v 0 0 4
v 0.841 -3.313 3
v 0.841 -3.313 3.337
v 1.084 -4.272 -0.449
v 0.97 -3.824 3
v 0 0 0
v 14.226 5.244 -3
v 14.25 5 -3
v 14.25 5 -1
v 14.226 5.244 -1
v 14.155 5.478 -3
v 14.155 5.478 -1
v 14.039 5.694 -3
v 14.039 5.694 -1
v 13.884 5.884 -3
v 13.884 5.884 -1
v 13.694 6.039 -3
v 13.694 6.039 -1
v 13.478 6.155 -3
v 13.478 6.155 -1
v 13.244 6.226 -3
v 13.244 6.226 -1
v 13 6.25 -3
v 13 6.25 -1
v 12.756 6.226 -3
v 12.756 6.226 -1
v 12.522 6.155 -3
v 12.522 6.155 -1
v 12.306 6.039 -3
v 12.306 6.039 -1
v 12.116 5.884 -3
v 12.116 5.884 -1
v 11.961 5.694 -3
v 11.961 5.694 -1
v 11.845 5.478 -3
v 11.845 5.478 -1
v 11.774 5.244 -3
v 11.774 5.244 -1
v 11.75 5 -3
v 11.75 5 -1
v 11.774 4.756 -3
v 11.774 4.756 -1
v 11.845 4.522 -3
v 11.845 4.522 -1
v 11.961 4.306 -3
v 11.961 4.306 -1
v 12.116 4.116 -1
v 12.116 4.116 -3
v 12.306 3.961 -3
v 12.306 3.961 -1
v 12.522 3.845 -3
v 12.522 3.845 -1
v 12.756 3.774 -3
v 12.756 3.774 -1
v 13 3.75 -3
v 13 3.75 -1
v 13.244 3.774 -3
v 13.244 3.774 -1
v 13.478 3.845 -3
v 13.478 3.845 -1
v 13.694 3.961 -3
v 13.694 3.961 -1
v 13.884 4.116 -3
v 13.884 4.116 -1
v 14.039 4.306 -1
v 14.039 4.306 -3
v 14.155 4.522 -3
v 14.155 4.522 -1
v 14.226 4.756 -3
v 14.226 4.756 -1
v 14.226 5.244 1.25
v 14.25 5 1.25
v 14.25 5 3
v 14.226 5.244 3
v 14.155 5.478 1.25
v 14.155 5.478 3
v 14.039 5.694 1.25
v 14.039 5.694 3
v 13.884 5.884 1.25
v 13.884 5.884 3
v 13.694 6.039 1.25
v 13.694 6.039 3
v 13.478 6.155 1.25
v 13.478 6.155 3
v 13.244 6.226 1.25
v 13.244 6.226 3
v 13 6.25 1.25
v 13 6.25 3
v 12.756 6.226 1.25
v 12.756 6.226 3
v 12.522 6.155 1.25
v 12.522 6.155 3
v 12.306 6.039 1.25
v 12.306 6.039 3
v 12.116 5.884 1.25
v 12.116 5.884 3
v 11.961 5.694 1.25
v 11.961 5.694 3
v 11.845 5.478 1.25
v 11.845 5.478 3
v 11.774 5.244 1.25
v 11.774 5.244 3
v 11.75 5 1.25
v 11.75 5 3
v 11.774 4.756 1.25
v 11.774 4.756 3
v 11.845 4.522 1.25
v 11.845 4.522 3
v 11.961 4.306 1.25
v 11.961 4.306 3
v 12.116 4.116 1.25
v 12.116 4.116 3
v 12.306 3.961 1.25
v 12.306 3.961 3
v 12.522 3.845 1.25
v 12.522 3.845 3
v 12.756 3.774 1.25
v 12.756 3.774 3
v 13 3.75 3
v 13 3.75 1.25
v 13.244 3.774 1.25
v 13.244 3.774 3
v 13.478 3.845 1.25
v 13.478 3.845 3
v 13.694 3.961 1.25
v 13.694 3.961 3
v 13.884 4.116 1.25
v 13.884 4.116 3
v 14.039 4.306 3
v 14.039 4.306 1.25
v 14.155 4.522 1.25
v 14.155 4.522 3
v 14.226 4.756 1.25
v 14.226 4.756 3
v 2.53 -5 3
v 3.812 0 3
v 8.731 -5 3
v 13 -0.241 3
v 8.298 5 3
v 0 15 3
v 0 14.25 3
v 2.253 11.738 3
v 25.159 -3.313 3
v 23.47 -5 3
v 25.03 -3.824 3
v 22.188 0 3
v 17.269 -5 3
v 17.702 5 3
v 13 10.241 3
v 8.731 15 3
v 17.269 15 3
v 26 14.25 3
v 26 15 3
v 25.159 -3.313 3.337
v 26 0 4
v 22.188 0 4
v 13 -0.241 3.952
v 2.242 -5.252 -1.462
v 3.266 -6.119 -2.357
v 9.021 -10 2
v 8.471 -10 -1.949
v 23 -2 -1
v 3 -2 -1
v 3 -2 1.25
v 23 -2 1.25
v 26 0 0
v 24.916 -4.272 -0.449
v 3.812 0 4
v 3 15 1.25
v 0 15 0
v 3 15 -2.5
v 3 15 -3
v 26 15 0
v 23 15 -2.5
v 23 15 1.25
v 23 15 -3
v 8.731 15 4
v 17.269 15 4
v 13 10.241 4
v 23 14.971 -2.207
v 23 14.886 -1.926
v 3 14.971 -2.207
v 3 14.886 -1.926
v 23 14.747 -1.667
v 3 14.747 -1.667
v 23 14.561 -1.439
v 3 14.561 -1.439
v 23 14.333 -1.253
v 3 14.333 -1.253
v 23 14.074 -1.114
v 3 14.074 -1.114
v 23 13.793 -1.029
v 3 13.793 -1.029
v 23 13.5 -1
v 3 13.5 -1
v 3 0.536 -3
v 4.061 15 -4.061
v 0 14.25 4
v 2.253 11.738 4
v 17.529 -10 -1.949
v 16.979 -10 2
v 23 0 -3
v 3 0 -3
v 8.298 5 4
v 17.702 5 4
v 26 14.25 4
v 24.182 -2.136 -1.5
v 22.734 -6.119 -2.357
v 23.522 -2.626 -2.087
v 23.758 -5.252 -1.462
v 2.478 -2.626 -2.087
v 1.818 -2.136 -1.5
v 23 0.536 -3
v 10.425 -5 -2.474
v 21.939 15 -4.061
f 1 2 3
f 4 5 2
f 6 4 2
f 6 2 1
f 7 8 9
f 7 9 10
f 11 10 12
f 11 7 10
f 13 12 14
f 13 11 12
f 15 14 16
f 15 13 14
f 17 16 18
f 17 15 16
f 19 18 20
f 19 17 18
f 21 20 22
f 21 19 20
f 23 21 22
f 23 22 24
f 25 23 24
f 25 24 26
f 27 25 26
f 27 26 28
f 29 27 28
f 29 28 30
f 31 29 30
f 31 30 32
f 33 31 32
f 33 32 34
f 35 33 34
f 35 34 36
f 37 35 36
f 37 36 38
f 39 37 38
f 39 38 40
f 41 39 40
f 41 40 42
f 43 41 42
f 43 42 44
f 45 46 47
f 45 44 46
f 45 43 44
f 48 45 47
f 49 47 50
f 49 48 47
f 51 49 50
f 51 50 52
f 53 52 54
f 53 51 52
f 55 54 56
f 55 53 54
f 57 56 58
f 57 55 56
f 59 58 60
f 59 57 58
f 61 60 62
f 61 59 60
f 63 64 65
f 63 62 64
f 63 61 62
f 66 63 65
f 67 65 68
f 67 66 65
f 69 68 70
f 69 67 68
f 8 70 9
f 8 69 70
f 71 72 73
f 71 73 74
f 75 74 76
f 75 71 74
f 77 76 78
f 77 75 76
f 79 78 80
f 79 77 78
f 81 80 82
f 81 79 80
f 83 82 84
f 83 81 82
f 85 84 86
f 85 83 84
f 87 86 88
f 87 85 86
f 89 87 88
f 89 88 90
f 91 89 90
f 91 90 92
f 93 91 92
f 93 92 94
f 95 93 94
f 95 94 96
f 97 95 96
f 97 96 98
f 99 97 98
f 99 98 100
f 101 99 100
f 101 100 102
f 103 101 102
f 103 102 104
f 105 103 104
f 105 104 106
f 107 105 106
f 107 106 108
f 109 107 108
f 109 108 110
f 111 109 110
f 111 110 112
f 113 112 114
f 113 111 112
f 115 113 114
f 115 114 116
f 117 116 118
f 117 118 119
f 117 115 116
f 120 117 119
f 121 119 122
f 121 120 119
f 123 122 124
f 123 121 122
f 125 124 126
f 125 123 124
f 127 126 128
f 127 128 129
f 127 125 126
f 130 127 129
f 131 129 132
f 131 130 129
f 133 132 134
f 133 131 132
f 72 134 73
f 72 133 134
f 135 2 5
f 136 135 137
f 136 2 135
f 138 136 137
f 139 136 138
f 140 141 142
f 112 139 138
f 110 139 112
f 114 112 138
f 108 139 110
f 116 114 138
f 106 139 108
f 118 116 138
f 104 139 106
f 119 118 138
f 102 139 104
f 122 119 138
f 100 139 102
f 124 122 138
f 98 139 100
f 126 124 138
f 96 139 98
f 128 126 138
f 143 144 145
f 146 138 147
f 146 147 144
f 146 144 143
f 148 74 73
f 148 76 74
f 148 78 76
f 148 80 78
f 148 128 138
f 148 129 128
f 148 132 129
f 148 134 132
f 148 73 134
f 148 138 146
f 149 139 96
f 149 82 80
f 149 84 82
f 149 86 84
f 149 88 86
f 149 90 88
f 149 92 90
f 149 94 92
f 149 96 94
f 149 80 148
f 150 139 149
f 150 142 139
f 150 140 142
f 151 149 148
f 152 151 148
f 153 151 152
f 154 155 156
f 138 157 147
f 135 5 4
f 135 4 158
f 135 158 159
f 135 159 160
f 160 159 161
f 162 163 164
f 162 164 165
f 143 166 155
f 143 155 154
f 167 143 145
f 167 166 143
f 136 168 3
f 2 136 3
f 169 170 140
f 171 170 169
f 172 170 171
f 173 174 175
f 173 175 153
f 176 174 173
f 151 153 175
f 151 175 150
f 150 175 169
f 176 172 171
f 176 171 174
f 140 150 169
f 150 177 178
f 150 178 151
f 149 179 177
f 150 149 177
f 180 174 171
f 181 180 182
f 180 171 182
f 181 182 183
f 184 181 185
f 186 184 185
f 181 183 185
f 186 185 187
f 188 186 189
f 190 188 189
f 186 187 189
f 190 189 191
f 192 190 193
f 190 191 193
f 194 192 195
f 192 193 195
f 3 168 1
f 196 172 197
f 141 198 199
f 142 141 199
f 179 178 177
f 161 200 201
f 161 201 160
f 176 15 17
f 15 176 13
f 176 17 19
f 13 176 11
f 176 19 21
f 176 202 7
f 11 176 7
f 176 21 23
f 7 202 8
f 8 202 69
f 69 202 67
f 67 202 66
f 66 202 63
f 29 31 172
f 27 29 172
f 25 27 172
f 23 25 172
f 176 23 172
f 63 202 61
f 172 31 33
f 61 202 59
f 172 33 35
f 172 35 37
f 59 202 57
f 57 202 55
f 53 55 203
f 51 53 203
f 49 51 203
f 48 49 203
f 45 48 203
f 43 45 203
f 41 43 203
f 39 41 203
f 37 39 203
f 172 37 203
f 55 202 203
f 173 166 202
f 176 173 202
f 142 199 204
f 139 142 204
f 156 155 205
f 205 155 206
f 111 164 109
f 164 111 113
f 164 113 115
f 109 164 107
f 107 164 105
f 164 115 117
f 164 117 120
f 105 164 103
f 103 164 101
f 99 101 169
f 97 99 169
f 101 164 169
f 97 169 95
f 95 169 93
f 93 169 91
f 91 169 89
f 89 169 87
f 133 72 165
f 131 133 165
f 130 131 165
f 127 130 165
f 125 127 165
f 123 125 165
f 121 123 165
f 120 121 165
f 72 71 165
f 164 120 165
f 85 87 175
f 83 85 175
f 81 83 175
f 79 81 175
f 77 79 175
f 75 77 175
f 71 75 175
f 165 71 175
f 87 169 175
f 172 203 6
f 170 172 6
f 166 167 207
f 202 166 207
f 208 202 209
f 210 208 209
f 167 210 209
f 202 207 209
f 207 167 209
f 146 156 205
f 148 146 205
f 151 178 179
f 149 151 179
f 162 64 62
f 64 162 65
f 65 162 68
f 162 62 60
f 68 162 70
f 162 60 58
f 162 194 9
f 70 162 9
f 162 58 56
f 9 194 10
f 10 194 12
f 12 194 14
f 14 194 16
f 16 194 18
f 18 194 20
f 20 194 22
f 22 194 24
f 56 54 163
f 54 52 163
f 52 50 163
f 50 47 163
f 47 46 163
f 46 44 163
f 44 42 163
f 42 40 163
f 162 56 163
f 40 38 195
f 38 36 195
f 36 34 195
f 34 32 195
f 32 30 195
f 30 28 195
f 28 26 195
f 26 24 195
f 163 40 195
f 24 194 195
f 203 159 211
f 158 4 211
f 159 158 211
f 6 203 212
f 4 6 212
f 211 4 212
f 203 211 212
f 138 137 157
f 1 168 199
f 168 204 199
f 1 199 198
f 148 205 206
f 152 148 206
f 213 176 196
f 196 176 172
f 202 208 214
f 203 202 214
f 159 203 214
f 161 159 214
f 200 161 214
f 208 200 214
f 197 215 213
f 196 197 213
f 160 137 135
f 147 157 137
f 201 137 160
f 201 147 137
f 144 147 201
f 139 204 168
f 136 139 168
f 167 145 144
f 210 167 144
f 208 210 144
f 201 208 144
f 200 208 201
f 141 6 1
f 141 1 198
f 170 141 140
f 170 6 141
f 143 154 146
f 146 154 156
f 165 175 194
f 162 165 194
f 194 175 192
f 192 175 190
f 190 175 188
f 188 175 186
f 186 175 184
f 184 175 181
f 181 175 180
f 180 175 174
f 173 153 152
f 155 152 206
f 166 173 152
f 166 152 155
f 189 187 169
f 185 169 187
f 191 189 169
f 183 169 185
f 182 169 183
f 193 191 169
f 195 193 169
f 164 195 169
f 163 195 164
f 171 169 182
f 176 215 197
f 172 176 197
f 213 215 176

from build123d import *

# Parameters (mm, degrees)
EXTRUDE_1_DEPTH           = 15
EXTRUDE_1_OTHER_WAY_DEPTH = 10
EXTRUDE_1_OTHER_WAY_TAPER = 6
CUT_EXTRUDE_1_DEPTH       = 17
EXTRUDE_2_DEPTH           = 1
EXTRUDE_3_REACH           = 32.166
EXTRUDE_4_DEPTH           = 3
CUT_EXTRUDE_3_DEPTH       = 31.282007959
EXTRUDE_5_DEPTH           = 15
CHAMFER_2_SIZE            = 15
CHAMFER_2_SIZE_2          = 1.1
CUT_EXTRUDE_2_DEPTH       = 31.430248211
CUT_EXTRUDE_2_DEPTH_BACK  = 31.430248211
SKETCH_3_R                = 1.25
SKETCH_8_R                = 1.25
CUT_EXTRUDE_6_DEPTH       = 1
CUT_EXTRUDE_7_DEPTH       = 10
FILLET_1_R                = 1.5
SKETCH_13_W               = 20
SKETCH_13_H               = 0.25
CUT_EXTRUDE_8_DEPTH       = 17


with BuildPart() as part:
    # Эскиз1 → Бобышка-Вытянуть1 (new body)
    with BuildSketch(Plane(origin=(0, 0, 0), x_dir=(1, 0, 0), z_dir=(0, 1, 0))):
        Polygon((0, 0), (3, 0), (13, 0), (26, 0), (23, 3), (3, 3), align=None)
    extrude(amount=EXTRUDE_1_DEPTH)

    # Эскиз1 → Бобышка-Вытянуть1 other way (add)
    with BuildSketch(Plane(origin=(0, 0, 0), x_dir=(1, 0, 0), z_dir=(0, 1, 0))):
        Polygon((0, 0), (3, 0), (13, 0), (26, 0), (23, 3), (3, 3), align=None)
    extrude(amount=-EXTRUDE_1_OTHER_WAY_DEPTH, taper=EXTRUDE_1_OTHER_WAY_TAPER)

    # Эскиз2 → Вырез-Вытянуть1 (cut)
    with BuildSketch(Plane(origin=(0, 15, 0), x_dir=(1, 0, 0), z_dir=(0, 1, 0))):
        Polygon((13, 0), (23, 0), (23, 1), (3, 1), (3, 0), align=None)
    extrude(amount=-CUT_EXTRUDE_1_DEPTH, mode=Mode.SUBTRACT)

    # Эскиз4 → Бобышка-Вытянуть2 (add)
    with BuildSketch(Plane.XY):
        Polygon((0, 15), (3, 15), (3, -2), (23, -2), (23, 15), (26, 15), (26, 0), (23.462559298, -10), (2.537440702, -10), (0, 0), align=None)
    extrude(amount=EXTRUDE_2_DEPTH)

    # Эскиз5 → Бобышка-Вытянуть3 (add, up to next)
    with BuildSketch(Plane(origin=(0, 0, 0), x_dir=(-1, 0, 0), z_dir=(0, 0, -1)), mode=Mode.PRIVATE) as extrude_3_sk1:
        Polygon((-26, 0), (-23.462559298, -10), (-2.537440702, -10), (0, 0), (-3, 0), (-3, -2), (-23, -2), (-23, 0), align=None)
    extrude_3_tool1 = extrude(extrude_3_sk1.sketch, amount=EXTRUDE_3_REACH, mode=Mode.PRIVATE) - part.part
    add(extrude_3_tool1.solids().sort_by_distance((13, -5.604799, 0))[0])

    # Эскиз6 → Бобышка-Вытянуть4 (add)
    with BuildSketch(Plane.XY.offset(1)):
        Polygon((0, 15), (26, 15), (26, 0), (23.462559298, -10), (2.537440702, -10), (0, 0), align=None)
    extrude(amount=EXTRUDE_4_DEPTH)

    # Эскиз7 → Вырез-Вытянуть3 (cut, through all)
    with BuildSketch(Plane(origin=(26, 0, 0), x_dir=(0, 0, -1), z_dir=(1, 0, 0))):
        Polygon((-4, 0), (-2, -10), (-4, -10), align=None)
    extrude(amount=-CUT_EXTRUDE_3_DEPTH, mode=Mode.SUBTRACT)

    # Эскиз3 → Вырез-Вытянуть2 (cut, two sides: drawn at the far end of the back side and taken through both)
    with BuildSketch(Plane.XY.offset(-1).offset(-CUT_EXTRUDE_2_DEPTH_BACK)):
        with Locations((13, 5)):
            Circle(SKETCH_3_R)
    extrude(amount=CUT_EXTRUDE_2_DEPTH + CUT_EXTRUDE_2_DEPTH_BACK, mode=Mode.SUBTRACT)

    # Эскиз8 → Вырез-Вытянуть6 (cut)
    # profile 1 of 9: a face of its own
    with BuildSketch(Plane.XY.offset(4)):
        Polygon((0, 15), (8.73082864, 15), (1.328128151, 23.251624877), (-3.882385082, 18.577167491), (0, 14.249559563), align=None)
    # profile 2 of 9: a face of its own
    with BuildSketch(Plane.XY.offset(4)):
        Polygon((8.297967991, 5), (13, 10.241250048), (8.73082864, 15), (0, 15), (0, 14.249559563), (2.253001305, 11.738189335), align=None)
    # profile 3 of 9: a face of its own
    with BuildSketch(Plane.XY.offset(4)):
        Polygon((13.216430324, 0), (15.605256616, 2.662771307), (17.702032009, 5), (13, 10.241250048), (8.297967991, 5), (12.783569676, 0), align=None)
        with Locations((13, 5)):
            Circle(SKETCH_8_R, mode=Mode.SUBTRACT)
    # profile 4 of 9: a face of its own
    with BuildSketch(Plane.XY.offset(4)):
        Polygon((13, 10.241250048), (17.702032009, 5), (26, 14.249559563), (26, 15), (17.26917136, 15), align=None)
    # profile 5 of 9: a face of its own
    with BuildSketch(Plane.XY.offset(4)):
        Polygon((22.187633693, 0), (13.216430324, 0), (13, -0.241250048), (22.828799983, -11.197193837), (28.039313215, -6.522736451), align=None)
    # profile 6 of 9: a face of its own
    with BuildSketch(Plane.XY.offset(4)):
        Polygon((17.702032009, 5), (15.605256616, 2.662771307), (13.216430324, 0), (22.187633693, 0), align=None)
    # profile 7 of 9: a face of its own
    with BuildSketch(Plane.XY.offset(4)):
        Polygon((4.245226956, -10), (13, -0.241250048), (12.783569676, 0), (3.812366307, 0), (-0.965286277, -5.325542614), align=None)
    # profile 8 of 9: a face of its own
    with BuildSketch(Plane.XY.offset(4)):
        Polygon((3.812366307, 0), (12.783569676, 0), (8.297967991, 5), align=None)
    # profile 9 of 9: a face of its own
    with BuildSketch(Plane.XY.offset(4)):
        Polygon((13, -0.241250048), (13.216430324, 0), (12.783569676, 0), align=None)
    extrude(amount=-CUT_EXTRUDE_6_DEPTH, mode=Mode.SUBTRACT)

    # Эскиз9 → Вырез-Вытянуть7 (cut)
    with BuildSketch(Plane(origin=(0, -0.311867536, -2.967221401), x_dir=(-1, 0, 0), z_dir=(0, -0.1045284632676535, -0.9945218953682734))):
        Polygon((-26.132775008, -3.289566809), (-16.54562193, -10.479237314), (-26.132775008, -10.479237314), align=None)
        Polygon((0.132775008, -10.479237314), (0.132775008, -3.289566809), (-9.45437807, -10.479237314), align=None)
    extrude(amount=-CUT_EXTRUDE_7_DEPTH, mode=Mode.SUBTRACT)

    # Скругление1
    fillet_1_edges = [part.edges().sort_by_distance(p)[0] for p in [
        (13, 15, -1),
    ]]
    fillet(fillet_1_edges, radius=FILLET_1_R)

    # Эскиз13 → Вырез-Вытянуть8 (cut)
    with BuildSketch(Plane(origin=(0, 15, 0), x_dir=(1, 0, 0), z_dir=(0, 1, 0))):
        with Locations((13, -1.125)):
            Rectangle(SKETCH_13_W, SKETCH_13_H)
    extrude(amount=-CUT_EXTRUDE_8_DEPTH, mode=Mode.SUBTRACT)


with BuildPart() as body_2:
    # Эскиз11 → Бобышка-Вытянуть5 (new body)
    with BuildSketch(Plane(origin=(0, 15, 0), x_dir=(1, 0, 0), z_dir=(0, 1, 0))):
        Polygon((3, 3), (4.060660172, 4.060660172), (21.939339828, 4.060660172), (23, 3), align=None)
    extrude(amount=-EXTRUDE_5_DEPTH)

    # Фаска2
    # the kernel refuses this chamfer: 15, 1.1 mm, written as the material it takes off along each edge
    with BuildSketch(Plane(origin=(-34.935477004, 0, -4.060660172), x_dir=(0, 0.9999960428385148, -0.0028132378696003233), z_dir=(1, 0, 0))) as chamfer_2_piece_1:
        Polygon((CHAMFER_2_SIZE * 0.999996042839, CHAMFER_2_SIZE * 0.0028132378696), (-CHAMFER_2_SIZE_2 * 0.0028132378696, CHAMFER_2_SIZE_2 * 0.999996042839), (0, 0), align=None)
    extrude(amount=95.870954008, mode=Mode.SUBTRACT)


solid = Compound([part.part, body_2.part])
